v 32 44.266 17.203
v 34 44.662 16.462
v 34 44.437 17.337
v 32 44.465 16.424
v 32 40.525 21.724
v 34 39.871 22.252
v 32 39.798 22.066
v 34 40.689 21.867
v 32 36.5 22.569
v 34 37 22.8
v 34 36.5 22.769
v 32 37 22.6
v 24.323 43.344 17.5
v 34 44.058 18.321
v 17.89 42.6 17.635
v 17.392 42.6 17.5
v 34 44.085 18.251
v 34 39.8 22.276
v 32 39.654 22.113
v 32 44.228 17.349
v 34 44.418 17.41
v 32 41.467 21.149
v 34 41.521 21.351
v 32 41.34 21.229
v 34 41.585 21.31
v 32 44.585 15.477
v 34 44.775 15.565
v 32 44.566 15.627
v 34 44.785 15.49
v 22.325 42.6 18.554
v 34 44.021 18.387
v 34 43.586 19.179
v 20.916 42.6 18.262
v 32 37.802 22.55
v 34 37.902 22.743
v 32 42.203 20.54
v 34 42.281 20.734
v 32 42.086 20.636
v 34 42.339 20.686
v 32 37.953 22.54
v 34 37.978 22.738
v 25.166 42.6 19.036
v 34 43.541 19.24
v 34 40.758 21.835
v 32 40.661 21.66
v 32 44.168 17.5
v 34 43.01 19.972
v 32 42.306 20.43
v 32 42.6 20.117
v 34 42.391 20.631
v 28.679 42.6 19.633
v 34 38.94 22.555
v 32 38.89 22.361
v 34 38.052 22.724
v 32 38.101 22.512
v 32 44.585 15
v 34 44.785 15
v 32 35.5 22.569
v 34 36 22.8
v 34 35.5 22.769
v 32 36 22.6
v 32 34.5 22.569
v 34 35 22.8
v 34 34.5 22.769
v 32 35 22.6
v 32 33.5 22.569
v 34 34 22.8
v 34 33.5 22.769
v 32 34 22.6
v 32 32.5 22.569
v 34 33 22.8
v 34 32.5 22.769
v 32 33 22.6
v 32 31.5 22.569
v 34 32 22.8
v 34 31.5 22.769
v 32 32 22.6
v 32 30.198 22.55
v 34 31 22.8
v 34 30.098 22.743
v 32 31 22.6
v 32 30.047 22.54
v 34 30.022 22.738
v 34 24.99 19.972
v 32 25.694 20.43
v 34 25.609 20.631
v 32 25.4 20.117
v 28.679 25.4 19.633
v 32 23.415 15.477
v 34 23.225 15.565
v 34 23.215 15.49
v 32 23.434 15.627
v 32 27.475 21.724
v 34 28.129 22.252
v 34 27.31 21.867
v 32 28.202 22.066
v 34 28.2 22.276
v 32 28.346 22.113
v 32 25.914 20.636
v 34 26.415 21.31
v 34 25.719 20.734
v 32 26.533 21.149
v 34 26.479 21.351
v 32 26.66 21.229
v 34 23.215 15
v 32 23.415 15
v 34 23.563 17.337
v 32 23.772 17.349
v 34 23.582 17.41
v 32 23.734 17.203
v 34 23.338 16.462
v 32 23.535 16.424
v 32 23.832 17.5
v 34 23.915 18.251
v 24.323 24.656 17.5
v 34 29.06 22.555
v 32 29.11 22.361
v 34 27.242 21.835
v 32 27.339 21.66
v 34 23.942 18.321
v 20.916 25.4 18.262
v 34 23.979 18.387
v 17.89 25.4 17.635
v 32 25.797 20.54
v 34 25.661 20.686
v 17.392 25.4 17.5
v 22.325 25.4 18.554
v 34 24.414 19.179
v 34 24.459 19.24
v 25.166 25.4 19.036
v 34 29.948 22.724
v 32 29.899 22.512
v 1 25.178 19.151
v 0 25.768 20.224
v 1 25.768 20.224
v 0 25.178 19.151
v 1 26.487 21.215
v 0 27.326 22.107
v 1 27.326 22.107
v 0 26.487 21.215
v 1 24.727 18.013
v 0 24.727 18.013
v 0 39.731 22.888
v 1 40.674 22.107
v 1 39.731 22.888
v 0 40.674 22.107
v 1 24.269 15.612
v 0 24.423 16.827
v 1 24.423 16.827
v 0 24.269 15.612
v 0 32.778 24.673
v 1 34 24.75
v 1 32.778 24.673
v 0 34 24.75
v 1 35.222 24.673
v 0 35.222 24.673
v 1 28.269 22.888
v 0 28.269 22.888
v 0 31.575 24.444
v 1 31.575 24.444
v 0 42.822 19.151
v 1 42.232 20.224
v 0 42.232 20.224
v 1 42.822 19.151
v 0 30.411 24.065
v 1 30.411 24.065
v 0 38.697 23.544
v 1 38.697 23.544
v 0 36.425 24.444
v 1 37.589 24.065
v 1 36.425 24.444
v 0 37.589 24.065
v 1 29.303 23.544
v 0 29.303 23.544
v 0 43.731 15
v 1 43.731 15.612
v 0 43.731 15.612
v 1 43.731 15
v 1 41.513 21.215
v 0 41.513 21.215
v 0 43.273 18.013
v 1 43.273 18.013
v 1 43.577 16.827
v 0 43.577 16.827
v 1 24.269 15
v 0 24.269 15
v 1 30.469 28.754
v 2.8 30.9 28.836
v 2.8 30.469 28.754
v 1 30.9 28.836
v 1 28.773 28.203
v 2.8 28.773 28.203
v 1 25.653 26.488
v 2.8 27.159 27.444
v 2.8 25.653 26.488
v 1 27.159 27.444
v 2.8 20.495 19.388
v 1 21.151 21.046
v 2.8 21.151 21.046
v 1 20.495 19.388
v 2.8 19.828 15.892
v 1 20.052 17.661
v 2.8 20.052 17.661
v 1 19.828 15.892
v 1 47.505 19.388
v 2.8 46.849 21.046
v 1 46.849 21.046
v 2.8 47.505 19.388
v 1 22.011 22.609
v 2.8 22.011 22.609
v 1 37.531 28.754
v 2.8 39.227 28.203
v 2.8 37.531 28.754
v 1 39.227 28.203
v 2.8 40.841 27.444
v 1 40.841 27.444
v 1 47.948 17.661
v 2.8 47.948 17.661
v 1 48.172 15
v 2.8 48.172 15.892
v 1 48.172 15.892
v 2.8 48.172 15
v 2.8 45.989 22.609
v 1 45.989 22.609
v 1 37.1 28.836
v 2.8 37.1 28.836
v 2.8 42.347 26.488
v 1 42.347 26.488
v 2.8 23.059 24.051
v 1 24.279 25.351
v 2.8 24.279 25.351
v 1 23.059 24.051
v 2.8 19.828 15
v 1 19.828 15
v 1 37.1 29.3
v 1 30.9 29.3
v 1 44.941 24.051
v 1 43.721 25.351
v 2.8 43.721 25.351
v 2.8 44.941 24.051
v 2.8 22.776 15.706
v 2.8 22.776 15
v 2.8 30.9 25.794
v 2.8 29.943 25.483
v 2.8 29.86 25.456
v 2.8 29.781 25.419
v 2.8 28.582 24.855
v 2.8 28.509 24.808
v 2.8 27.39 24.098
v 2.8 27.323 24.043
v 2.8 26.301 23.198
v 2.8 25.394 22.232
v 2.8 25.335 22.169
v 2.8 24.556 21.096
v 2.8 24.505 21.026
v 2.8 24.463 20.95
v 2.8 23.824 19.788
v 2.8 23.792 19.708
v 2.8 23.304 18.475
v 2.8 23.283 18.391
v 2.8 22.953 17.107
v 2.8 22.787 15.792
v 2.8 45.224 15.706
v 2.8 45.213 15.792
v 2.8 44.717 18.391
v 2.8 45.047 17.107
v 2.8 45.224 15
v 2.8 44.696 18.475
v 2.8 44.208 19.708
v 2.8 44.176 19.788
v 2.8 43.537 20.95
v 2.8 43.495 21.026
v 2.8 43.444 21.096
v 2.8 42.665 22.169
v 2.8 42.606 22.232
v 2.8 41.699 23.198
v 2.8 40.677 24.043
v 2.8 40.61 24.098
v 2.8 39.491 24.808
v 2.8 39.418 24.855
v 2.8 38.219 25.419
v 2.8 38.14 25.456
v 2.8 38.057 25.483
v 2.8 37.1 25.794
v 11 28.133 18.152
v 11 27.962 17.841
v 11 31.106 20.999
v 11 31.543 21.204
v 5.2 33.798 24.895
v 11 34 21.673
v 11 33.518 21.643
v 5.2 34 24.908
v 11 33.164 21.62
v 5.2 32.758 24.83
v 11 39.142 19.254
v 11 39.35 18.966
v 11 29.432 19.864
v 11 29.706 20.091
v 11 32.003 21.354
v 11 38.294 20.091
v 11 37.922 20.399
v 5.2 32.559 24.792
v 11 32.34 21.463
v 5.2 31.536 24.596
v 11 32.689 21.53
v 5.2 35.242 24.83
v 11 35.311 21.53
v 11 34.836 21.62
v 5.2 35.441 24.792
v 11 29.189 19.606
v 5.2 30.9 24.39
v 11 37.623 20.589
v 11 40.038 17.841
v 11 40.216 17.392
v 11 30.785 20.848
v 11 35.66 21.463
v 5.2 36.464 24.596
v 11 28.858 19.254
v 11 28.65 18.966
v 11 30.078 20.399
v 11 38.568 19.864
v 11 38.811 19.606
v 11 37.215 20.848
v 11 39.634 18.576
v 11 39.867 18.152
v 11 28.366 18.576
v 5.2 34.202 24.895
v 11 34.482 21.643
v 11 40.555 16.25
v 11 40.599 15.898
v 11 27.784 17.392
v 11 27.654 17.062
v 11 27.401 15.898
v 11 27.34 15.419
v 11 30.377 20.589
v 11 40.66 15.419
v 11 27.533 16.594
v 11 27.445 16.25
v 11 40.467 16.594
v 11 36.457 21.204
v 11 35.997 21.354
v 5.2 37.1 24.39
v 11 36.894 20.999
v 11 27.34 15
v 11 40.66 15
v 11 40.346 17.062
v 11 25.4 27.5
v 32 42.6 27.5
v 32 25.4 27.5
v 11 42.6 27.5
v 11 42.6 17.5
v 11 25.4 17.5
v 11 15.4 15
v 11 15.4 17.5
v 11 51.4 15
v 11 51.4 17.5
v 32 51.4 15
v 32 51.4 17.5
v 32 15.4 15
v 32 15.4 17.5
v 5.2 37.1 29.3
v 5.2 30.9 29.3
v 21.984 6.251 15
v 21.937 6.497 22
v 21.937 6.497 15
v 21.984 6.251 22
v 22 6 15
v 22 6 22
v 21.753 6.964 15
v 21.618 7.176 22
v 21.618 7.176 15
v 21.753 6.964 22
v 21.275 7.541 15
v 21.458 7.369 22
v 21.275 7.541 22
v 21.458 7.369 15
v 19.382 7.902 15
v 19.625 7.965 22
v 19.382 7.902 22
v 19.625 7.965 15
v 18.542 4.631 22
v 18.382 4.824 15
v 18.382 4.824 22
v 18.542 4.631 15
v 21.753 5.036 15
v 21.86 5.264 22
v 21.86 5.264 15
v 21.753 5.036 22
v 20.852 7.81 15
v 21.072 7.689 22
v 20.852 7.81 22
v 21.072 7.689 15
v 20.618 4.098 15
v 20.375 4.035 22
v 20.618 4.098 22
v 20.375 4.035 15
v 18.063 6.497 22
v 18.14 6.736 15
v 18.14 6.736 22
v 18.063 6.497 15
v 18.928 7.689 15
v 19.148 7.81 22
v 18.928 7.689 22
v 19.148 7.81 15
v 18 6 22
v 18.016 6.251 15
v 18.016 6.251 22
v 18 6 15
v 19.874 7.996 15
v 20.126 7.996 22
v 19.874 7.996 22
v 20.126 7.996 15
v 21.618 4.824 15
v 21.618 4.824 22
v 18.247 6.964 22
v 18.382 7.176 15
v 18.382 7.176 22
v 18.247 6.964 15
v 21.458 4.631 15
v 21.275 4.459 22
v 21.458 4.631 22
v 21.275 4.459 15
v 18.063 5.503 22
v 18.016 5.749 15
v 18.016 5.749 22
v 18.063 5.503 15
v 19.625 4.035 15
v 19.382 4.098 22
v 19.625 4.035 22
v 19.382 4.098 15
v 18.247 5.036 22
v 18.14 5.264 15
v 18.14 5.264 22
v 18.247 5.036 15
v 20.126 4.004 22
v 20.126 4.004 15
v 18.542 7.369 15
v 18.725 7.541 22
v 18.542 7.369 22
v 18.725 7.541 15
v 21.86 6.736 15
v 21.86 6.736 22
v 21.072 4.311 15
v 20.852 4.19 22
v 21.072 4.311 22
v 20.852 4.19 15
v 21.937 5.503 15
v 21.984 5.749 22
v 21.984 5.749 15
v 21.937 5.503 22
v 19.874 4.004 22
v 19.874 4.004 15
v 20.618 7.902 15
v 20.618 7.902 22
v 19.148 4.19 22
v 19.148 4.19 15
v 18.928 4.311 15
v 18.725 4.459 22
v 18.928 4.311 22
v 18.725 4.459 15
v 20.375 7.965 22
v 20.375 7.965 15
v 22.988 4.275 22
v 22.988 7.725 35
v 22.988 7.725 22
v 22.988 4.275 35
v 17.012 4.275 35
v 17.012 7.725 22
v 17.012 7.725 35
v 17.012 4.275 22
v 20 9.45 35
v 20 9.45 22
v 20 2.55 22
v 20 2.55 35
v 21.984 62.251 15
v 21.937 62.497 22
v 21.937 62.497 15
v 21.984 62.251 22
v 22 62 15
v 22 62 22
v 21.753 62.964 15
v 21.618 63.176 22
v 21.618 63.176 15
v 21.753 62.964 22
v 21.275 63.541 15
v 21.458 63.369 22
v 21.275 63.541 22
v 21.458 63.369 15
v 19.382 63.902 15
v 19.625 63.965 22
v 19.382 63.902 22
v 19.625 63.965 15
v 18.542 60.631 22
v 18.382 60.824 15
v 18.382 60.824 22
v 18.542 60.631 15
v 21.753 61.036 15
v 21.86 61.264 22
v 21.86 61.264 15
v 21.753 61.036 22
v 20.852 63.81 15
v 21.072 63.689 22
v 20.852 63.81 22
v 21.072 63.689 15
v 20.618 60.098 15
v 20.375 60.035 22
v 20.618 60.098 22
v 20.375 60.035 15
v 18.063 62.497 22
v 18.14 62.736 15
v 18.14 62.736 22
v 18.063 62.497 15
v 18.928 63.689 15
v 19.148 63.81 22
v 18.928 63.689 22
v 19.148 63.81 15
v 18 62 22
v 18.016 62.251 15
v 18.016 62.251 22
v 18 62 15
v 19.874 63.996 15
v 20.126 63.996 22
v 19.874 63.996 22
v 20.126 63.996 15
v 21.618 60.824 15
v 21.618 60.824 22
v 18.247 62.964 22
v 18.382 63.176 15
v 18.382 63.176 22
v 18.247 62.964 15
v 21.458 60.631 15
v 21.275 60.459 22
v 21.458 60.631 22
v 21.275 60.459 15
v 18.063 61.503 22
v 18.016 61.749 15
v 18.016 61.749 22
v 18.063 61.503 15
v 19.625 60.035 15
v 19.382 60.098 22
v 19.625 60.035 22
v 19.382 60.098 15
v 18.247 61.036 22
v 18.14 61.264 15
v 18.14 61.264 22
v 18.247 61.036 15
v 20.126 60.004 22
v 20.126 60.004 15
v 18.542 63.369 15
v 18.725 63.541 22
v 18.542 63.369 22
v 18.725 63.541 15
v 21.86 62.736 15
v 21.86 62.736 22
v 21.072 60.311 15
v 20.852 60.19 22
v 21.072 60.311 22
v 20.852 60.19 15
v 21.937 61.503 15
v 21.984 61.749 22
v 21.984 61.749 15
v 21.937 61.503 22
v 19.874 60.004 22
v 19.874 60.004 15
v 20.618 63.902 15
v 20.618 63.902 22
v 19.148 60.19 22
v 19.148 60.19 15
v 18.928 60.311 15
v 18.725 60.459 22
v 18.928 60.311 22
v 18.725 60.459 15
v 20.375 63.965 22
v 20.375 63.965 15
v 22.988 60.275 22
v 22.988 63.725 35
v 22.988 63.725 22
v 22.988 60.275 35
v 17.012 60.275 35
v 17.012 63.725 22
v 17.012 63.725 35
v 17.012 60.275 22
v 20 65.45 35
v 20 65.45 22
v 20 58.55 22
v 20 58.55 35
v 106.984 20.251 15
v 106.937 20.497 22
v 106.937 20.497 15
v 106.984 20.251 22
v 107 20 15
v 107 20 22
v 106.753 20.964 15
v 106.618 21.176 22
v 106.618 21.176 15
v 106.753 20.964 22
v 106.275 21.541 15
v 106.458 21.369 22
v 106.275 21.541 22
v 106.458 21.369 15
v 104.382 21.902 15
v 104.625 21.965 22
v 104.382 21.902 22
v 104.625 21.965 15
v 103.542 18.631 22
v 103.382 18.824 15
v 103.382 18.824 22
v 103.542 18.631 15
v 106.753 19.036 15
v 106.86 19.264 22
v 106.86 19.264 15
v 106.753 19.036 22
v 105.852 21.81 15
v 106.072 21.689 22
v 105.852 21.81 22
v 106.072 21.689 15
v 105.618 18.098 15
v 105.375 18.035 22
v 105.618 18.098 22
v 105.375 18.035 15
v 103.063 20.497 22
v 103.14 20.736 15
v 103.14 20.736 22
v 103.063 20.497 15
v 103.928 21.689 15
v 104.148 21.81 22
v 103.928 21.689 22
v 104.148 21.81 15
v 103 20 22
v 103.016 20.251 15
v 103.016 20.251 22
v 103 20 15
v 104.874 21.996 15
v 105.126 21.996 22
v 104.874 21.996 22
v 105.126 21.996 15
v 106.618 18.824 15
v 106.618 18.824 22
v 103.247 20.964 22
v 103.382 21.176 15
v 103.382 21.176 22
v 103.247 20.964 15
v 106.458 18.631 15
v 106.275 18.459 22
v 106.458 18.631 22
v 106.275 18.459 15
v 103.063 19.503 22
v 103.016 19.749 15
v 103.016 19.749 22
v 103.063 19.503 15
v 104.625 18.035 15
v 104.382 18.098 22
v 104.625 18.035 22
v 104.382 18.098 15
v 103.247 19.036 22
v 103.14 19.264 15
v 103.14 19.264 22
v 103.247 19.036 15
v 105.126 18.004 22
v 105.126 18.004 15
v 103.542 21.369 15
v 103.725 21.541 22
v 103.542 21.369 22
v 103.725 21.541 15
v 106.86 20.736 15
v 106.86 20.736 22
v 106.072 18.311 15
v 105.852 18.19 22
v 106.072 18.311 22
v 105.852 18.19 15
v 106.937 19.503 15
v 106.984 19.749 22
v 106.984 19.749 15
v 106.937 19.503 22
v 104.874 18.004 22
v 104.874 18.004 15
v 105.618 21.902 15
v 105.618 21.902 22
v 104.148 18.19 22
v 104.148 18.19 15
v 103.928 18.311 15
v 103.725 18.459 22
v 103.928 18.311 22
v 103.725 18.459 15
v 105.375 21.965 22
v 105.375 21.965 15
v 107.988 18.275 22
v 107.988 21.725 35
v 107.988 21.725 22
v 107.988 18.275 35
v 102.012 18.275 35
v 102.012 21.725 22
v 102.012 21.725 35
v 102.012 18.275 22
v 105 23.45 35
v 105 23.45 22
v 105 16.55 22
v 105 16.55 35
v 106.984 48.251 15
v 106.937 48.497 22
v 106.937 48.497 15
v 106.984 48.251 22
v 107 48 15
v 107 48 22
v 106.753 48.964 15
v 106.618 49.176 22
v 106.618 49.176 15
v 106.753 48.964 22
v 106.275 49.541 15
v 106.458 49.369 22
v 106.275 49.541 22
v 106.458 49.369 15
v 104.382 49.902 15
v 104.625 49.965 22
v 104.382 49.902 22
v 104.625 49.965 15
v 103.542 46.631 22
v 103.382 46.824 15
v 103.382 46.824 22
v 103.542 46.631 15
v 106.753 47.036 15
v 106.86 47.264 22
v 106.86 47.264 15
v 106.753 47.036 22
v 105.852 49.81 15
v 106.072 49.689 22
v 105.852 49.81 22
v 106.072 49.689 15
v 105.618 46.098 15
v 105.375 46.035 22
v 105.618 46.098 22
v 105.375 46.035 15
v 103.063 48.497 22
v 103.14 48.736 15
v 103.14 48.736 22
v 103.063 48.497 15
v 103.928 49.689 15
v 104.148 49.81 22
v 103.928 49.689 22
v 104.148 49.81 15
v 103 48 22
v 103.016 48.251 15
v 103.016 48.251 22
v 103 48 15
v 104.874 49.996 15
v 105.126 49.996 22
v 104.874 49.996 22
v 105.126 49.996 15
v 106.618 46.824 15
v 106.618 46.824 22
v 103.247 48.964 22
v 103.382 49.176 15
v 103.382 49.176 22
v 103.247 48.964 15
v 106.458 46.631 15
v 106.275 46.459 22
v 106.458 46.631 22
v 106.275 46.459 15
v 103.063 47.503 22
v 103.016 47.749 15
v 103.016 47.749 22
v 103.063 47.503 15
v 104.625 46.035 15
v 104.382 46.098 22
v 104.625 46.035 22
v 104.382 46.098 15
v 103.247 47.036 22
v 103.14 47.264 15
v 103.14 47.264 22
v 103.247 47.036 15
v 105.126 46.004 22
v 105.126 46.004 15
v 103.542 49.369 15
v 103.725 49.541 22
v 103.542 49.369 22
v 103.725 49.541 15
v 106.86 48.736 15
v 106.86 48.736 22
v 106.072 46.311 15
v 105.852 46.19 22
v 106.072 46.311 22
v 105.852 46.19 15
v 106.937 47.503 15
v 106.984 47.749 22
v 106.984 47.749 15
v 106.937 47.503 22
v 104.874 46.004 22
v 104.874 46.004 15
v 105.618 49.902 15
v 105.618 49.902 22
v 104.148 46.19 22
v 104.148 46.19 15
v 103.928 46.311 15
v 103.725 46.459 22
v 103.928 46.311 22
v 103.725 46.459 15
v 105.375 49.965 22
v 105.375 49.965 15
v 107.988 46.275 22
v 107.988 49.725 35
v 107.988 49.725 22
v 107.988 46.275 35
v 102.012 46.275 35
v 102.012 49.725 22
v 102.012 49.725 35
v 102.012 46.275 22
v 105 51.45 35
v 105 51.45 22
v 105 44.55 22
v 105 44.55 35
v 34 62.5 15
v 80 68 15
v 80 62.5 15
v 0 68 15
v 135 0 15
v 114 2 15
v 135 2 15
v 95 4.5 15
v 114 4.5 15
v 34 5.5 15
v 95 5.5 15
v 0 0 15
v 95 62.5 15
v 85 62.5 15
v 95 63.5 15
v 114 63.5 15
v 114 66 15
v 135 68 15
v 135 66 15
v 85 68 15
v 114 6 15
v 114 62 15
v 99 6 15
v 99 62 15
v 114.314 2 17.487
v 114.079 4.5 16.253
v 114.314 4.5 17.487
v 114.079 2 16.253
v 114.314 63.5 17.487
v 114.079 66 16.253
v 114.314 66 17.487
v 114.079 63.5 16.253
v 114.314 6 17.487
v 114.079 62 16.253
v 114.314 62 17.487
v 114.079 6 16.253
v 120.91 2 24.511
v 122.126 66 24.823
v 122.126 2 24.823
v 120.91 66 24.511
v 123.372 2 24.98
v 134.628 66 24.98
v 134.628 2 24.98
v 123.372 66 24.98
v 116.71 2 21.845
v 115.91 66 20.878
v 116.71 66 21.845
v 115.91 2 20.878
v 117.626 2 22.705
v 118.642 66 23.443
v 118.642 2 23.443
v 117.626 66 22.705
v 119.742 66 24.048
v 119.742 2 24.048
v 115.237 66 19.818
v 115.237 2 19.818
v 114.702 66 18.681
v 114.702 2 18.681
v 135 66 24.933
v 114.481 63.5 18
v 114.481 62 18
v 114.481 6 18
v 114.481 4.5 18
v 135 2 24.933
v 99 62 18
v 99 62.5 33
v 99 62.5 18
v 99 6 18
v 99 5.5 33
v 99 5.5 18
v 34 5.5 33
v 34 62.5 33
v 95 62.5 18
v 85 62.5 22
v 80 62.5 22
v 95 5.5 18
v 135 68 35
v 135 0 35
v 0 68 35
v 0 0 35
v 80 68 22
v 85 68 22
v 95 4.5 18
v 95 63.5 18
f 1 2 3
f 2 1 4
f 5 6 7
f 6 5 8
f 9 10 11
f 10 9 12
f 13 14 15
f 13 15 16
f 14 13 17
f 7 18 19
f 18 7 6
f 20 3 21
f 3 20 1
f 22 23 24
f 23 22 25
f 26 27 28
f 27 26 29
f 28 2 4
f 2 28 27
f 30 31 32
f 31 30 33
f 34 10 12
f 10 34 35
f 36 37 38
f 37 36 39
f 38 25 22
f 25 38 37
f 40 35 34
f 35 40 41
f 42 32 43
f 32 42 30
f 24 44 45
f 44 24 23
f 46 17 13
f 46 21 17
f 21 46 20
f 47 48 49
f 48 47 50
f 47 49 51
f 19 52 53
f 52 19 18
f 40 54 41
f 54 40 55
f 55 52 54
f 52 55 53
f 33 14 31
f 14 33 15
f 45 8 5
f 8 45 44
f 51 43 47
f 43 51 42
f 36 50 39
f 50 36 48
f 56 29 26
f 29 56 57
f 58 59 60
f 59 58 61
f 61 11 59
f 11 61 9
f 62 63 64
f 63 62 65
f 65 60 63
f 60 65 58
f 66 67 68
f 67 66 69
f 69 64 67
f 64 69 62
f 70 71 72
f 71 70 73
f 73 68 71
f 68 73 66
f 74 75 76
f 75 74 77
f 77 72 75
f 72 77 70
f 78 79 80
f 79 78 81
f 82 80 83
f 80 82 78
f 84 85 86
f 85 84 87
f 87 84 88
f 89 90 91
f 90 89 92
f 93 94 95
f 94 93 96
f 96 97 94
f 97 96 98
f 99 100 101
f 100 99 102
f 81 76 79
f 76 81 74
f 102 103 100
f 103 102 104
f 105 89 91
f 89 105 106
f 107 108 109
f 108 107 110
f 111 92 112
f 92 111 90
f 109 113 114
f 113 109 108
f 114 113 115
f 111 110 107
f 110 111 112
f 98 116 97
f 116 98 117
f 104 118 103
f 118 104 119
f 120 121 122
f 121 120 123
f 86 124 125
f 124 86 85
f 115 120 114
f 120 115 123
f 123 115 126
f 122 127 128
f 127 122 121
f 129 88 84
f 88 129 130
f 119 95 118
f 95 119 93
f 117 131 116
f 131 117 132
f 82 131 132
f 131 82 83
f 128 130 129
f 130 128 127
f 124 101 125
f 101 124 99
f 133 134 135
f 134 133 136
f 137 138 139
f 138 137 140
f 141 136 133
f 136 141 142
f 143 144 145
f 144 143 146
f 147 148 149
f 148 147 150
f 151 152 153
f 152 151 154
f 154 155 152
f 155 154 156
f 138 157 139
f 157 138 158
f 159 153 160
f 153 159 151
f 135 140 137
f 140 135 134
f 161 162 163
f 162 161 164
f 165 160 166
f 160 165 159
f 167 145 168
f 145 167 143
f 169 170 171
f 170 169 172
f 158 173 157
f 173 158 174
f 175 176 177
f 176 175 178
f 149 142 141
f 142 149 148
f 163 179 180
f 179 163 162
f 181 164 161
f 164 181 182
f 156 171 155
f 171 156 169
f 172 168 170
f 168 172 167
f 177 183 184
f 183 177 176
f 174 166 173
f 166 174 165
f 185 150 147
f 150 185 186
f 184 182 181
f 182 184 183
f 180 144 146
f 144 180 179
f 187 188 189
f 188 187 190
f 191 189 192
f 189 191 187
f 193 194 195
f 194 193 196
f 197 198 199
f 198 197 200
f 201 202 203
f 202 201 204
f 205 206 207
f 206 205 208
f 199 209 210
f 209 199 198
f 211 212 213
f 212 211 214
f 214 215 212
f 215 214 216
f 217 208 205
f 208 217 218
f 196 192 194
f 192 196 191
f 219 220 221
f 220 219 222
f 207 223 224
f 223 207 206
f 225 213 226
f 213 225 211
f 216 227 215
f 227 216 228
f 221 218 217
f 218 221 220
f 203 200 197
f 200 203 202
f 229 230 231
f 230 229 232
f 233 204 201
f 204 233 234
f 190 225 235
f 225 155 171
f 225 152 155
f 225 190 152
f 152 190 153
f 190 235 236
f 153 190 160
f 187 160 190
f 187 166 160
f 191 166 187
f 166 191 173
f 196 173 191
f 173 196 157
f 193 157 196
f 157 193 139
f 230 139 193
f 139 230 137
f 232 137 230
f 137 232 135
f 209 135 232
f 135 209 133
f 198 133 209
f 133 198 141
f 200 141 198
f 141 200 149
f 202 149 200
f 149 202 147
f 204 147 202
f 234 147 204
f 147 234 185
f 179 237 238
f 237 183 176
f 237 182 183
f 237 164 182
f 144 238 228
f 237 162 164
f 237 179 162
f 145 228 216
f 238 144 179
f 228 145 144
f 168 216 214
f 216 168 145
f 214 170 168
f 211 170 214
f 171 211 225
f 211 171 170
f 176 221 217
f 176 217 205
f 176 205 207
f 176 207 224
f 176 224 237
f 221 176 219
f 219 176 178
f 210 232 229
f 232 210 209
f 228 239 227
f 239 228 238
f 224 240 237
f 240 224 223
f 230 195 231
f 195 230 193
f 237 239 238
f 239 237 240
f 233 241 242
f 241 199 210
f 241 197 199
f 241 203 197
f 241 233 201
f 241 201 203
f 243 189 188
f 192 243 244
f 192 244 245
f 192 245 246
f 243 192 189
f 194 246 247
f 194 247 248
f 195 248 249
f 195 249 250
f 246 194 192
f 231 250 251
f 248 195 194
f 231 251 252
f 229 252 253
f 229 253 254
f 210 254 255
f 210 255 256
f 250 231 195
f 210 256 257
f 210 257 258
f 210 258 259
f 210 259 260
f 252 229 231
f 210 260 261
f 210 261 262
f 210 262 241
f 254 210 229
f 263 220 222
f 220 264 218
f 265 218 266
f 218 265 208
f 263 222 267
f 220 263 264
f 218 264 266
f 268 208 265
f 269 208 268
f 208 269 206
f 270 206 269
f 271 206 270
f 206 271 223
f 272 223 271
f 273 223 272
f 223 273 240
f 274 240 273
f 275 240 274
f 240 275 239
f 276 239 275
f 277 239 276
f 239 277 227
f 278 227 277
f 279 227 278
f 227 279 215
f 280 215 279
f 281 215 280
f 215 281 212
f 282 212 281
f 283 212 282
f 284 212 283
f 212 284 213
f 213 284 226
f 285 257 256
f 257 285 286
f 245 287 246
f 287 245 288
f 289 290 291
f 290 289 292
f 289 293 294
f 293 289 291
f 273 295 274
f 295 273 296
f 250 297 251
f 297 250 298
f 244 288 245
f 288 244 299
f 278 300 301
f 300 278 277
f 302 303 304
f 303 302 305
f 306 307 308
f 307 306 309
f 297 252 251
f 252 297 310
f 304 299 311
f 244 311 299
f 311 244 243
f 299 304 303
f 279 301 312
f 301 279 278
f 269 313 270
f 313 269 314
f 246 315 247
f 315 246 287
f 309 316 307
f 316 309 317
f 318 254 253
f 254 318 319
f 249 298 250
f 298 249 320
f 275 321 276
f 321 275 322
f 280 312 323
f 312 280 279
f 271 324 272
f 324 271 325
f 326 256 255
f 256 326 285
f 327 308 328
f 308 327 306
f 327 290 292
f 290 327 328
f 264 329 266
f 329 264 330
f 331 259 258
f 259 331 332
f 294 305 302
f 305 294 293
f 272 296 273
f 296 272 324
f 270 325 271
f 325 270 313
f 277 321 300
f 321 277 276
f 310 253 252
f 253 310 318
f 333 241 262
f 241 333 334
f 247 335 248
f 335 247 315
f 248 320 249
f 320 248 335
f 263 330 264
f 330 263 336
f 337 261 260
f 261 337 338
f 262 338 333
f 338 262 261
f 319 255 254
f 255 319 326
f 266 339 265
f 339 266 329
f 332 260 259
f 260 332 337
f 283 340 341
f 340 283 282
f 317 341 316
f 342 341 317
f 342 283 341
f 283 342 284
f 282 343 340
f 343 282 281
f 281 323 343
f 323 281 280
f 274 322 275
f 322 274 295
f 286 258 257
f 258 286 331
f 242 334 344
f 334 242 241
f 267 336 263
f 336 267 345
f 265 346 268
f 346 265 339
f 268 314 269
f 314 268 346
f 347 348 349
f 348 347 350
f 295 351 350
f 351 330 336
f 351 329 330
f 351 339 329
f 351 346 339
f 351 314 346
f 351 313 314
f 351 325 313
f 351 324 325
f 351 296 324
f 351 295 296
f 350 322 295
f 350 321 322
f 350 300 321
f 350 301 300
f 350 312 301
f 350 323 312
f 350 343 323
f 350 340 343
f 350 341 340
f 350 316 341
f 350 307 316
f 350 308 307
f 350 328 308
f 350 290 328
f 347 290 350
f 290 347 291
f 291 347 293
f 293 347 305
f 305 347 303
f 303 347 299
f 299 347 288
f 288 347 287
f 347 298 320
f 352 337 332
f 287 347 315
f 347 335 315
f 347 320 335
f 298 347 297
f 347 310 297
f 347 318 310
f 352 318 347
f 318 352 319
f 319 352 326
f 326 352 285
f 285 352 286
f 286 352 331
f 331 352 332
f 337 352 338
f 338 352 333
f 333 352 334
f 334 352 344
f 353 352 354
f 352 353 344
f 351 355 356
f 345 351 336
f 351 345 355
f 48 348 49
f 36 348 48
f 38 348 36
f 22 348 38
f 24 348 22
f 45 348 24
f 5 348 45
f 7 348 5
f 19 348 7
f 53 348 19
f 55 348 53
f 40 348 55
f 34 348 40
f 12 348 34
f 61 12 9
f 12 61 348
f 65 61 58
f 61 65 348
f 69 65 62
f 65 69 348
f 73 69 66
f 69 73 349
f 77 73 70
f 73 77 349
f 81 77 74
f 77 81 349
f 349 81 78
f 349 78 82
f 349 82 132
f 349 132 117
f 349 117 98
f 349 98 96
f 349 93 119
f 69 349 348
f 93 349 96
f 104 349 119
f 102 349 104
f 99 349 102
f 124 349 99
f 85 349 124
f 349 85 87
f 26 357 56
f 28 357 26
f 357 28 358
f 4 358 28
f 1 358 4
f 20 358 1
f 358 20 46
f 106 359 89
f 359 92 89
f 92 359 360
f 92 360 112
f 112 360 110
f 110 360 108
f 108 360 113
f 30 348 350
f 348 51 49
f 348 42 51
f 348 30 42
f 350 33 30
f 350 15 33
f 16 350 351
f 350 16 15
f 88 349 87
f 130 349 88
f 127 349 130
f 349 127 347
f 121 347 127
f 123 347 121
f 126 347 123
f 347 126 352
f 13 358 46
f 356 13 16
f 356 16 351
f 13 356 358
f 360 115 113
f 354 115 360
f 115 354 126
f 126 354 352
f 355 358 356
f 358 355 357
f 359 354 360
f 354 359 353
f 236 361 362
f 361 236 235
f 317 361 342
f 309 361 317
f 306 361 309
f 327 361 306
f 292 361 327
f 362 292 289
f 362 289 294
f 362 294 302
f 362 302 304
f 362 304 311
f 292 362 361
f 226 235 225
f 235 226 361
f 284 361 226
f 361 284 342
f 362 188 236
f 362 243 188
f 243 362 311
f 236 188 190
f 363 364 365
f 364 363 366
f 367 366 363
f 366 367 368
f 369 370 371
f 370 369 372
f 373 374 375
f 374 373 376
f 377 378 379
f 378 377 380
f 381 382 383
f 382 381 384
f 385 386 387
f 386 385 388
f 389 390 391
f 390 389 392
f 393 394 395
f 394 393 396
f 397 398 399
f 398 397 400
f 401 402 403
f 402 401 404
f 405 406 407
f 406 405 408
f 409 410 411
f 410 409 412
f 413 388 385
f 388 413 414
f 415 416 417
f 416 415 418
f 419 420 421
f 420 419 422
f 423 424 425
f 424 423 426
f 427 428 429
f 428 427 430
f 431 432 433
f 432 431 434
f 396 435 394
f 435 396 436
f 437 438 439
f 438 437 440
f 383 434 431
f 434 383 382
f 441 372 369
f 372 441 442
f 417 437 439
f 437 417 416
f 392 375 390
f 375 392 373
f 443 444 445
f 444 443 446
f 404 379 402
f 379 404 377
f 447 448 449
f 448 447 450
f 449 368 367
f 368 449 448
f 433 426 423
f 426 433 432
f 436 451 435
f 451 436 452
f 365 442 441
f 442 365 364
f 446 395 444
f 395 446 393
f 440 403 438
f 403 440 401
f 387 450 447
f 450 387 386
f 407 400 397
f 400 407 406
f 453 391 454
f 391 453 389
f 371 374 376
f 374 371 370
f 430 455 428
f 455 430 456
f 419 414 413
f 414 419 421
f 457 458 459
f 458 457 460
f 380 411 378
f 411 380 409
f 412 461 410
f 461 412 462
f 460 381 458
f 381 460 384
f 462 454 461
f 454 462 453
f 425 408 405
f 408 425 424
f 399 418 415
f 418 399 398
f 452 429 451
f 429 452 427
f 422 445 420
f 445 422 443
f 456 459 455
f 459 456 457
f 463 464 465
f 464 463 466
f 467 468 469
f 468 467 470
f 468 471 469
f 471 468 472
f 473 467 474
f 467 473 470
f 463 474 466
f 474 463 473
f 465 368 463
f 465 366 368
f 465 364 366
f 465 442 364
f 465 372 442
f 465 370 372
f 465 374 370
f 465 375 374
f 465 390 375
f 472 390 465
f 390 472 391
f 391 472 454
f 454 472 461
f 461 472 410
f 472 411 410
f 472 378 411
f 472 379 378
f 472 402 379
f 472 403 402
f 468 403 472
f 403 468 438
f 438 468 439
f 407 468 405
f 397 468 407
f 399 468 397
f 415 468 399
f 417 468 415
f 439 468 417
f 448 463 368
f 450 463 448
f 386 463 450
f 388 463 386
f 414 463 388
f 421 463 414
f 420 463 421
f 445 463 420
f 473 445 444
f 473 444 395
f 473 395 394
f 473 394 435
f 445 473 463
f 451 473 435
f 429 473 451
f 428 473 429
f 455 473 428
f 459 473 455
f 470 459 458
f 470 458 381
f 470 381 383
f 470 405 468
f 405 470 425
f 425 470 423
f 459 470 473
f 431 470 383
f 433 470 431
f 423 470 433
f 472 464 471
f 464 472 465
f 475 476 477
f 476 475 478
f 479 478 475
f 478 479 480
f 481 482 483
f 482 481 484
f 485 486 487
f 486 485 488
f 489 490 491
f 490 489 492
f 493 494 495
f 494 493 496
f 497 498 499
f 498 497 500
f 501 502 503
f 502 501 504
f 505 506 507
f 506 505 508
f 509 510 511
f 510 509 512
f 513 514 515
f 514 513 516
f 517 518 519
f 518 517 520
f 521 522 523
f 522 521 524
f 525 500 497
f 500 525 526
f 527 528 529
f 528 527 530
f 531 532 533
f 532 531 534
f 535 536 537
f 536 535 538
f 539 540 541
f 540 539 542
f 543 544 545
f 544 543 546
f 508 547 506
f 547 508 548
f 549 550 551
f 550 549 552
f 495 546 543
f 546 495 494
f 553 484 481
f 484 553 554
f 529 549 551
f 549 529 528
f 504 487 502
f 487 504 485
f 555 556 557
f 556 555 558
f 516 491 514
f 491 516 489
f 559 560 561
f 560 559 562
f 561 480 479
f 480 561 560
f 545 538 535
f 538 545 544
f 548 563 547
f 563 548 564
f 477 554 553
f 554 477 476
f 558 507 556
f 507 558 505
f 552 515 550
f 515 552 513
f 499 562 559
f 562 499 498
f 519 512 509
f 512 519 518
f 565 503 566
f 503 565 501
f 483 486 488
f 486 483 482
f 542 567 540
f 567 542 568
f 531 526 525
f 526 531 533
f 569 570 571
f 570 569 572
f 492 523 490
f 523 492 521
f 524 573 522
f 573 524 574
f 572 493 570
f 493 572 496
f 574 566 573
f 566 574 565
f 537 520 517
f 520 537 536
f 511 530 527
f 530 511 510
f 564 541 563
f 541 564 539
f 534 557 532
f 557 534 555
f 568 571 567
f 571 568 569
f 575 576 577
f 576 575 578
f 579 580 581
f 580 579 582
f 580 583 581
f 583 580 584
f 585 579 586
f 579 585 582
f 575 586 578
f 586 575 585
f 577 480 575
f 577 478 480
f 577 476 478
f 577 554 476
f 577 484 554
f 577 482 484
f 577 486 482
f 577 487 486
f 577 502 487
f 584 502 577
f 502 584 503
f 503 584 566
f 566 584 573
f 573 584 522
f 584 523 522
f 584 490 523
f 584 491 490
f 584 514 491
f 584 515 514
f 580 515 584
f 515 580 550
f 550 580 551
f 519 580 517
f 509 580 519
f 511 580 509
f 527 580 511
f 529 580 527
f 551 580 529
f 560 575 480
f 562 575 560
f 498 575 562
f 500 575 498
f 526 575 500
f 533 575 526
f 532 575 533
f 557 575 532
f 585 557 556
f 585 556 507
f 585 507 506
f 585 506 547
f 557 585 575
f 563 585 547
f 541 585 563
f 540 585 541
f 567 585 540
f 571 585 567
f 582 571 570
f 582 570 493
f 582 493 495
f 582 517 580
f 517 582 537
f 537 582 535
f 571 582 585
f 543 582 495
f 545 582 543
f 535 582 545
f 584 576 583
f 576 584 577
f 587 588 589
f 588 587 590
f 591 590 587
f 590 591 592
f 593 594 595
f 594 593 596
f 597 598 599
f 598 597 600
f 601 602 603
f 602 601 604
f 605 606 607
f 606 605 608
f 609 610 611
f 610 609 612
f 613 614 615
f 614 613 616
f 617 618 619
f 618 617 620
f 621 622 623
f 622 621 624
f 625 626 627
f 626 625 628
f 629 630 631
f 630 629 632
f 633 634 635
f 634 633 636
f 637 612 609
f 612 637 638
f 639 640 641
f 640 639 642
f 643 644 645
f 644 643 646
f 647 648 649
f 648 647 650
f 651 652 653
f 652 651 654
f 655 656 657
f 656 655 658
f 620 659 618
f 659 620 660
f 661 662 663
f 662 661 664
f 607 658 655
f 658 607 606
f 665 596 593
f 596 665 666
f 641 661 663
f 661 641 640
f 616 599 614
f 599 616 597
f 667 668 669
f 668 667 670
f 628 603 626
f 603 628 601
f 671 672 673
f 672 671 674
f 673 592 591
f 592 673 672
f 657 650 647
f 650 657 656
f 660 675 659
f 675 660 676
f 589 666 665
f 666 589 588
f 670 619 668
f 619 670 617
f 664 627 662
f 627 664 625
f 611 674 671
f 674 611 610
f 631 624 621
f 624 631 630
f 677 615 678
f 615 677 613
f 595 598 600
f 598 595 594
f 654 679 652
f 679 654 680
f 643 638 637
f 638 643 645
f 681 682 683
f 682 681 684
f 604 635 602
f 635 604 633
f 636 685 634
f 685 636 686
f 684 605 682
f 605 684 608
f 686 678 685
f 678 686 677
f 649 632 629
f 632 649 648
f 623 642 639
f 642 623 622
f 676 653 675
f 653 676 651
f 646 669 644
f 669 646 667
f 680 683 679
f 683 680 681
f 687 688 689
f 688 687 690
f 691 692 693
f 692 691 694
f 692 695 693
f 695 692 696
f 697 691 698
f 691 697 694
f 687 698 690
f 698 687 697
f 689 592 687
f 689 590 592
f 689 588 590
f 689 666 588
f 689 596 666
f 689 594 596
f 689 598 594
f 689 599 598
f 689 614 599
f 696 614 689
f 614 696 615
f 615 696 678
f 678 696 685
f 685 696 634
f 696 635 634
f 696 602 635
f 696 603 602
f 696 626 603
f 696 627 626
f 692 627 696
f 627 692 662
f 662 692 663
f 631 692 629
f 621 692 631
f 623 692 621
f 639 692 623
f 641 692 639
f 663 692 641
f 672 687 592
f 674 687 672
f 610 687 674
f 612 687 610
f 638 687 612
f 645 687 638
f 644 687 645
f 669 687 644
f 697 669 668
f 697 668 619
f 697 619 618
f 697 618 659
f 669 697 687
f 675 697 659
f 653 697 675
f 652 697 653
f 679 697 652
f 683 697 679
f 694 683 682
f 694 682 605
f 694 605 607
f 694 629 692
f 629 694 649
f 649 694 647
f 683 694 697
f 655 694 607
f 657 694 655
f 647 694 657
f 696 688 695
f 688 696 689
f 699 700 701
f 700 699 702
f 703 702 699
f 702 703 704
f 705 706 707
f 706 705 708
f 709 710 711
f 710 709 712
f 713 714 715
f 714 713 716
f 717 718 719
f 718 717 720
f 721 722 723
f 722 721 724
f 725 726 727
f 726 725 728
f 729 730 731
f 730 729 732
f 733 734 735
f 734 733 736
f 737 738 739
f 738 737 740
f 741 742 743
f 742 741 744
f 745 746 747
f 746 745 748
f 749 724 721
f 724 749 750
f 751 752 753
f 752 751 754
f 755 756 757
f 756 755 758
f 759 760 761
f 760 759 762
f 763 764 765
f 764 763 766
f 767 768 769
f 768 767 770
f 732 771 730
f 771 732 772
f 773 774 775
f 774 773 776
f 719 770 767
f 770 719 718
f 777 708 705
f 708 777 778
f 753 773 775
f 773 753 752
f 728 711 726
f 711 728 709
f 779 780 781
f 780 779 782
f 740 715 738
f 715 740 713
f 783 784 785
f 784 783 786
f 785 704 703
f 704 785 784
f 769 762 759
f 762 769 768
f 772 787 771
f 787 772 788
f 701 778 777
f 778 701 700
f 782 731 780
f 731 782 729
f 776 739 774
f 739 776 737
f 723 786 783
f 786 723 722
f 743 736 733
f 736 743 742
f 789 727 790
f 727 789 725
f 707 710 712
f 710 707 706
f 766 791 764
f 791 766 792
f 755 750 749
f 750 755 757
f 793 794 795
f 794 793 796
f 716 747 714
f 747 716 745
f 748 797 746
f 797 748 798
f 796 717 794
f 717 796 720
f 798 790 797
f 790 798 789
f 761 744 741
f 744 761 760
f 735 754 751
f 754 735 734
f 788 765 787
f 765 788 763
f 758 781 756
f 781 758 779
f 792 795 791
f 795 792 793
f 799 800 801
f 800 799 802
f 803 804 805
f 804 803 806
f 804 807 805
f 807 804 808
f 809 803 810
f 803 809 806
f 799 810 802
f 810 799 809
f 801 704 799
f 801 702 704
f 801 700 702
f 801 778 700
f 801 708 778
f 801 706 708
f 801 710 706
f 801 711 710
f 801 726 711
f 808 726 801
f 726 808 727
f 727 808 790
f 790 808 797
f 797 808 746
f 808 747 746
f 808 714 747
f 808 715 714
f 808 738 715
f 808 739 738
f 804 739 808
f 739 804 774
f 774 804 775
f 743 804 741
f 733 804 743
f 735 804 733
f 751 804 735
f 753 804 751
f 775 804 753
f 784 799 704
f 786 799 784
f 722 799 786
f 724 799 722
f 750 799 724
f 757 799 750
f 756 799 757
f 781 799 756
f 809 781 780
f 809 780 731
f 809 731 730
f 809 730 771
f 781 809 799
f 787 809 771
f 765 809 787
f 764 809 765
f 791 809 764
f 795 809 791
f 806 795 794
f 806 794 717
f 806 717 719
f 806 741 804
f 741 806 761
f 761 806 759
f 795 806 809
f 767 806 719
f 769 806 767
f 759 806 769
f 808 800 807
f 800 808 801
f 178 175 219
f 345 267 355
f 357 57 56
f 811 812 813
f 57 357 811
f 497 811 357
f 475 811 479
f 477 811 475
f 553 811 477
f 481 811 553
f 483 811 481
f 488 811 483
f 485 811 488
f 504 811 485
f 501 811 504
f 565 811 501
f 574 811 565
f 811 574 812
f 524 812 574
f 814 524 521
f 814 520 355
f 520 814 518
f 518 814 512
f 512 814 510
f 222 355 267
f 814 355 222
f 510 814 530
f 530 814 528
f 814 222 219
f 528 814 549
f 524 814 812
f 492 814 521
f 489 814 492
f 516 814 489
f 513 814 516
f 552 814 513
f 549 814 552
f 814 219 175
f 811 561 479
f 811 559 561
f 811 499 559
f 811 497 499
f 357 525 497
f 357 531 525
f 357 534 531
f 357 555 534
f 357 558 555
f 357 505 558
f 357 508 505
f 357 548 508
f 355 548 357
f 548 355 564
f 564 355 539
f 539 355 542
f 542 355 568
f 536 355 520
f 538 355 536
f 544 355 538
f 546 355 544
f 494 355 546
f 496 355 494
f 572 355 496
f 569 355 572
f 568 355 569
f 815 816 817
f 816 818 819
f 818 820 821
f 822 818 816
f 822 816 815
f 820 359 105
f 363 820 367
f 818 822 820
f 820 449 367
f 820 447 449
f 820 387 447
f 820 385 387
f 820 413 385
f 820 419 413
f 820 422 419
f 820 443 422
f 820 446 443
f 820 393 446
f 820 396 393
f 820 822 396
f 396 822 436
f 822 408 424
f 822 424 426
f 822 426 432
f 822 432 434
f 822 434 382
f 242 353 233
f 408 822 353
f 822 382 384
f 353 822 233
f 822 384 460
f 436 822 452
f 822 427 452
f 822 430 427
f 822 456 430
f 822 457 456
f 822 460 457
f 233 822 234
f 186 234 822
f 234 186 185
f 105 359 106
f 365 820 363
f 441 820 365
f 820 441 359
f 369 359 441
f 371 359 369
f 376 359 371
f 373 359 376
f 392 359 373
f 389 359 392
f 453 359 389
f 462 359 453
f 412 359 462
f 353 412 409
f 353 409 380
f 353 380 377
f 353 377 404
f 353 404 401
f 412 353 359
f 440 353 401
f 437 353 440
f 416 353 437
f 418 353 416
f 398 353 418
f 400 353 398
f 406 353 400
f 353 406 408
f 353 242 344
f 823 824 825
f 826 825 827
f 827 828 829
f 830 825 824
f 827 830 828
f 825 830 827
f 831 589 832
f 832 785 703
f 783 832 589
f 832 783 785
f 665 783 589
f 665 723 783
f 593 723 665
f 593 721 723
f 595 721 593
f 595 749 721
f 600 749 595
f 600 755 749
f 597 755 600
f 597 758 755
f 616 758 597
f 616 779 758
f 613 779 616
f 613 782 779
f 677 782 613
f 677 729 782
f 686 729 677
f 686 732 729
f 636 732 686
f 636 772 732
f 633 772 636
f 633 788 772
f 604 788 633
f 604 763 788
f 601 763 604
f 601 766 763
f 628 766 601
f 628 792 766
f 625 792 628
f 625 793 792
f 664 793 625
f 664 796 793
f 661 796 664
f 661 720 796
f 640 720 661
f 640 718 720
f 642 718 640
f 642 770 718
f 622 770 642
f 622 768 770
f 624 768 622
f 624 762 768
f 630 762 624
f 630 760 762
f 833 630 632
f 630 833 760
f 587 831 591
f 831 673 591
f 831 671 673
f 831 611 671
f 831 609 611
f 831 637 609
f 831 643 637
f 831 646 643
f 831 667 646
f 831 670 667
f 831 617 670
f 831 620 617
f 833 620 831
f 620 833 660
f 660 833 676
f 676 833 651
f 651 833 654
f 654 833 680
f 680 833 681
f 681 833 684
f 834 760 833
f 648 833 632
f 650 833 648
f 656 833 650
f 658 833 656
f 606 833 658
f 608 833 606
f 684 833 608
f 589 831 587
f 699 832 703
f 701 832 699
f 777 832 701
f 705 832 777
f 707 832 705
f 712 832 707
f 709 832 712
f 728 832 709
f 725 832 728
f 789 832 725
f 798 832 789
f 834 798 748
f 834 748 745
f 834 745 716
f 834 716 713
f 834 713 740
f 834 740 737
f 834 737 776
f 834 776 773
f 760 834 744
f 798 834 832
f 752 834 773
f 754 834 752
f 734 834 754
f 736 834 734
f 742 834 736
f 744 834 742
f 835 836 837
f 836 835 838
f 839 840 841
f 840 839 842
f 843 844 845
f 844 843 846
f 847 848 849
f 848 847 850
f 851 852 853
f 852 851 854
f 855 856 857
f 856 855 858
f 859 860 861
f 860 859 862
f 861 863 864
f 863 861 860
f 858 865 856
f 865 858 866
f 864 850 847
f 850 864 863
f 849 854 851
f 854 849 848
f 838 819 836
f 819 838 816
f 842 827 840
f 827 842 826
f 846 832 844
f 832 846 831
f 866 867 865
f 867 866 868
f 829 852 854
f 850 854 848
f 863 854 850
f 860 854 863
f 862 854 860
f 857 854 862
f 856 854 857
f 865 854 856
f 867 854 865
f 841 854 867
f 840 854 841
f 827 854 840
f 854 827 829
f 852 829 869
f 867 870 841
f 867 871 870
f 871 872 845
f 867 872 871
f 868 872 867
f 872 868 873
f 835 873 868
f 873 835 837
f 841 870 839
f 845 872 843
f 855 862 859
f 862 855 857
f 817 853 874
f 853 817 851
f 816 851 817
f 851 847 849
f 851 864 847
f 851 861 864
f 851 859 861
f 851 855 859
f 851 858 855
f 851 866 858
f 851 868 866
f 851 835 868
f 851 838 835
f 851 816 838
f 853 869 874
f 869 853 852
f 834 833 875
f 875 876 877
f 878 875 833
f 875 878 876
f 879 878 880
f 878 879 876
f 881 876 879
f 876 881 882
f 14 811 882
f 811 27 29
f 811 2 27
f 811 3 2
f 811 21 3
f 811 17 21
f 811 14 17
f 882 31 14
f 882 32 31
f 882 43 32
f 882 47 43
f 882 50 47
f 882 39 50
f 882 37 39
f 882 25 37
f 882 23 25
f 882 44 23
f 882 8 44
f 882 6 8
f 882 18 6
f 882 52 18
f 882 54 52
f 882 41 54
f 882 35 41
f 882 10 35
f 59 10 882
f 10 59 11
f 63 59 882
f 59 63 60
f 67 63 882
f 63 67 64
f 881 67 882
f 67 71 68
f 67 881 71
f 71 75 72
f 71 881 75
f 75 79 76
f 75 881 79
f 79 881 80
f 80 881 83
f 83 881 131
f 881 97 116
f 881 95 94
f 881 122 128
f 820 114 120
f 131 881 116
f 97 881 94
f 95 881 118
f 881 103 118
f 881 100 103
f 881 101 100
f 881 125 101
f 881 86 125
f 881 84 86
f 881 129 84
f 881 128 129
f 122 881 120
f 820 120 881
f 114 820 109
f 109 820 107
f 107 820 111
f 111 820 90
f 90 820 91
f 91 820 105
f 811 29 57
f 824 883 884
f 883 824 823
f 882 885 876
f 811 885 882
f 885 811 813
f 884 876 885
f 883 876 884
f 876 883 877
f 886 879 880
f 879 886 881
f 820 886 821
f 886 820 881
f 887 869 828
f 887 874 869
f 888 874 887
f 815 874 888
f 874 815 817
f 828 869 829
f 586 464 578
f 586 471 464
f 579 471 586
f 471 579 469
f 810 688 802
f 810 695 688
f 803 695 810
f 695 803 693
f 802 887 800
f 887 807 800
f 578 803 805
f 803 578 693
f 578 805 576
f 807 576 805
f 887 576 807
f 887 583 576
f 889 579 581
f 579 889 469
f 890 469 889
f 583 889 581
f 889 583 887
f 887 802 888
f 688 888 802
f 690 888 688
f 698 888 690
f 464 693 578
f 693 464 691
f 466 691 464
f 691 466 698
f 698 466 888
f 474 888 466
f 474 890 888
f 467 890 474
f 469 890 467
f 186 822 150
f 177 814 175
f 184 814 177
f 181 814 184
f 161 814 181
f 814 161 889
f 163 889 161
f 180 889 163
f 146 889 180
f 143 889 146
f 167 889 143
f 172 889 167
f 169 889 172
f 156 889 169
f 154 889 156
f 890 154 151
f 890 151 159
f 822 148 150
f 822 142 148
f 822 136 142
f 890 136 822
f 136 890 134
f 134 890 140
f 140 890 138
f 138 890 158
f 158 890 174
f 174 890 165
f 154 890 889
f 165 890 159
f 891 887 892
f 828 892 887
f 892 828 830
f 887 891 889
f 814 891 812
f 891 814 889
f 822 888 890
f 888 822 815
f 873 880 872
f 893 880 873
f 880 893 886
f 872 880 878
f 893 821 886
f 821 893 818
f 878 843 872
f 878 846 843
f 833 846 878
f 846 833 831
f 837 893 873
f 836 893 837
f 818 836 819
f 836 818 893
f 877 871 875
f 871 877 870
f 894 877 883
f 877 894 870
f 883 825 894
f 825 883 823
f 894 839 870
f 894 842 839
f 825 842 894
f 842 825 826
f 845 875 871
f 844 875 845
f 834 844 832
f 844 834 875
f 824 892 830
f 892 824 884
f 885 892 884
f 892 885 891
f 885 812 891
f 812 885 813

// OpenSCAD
l = 135;
w = 68;
h = 30;

pcb_w = 57;
pcb_l = 65;

rear_light_d = 24;
rear_light_h = 15;

stem_w = 35;
stem_d = 32;

seat_d = 27.1;


//-- Nut parameters
nut_h = 2.5;
nut_radius = 6.9/2;
nut_drill = 3.4;

module lens() {
  rotate( v = [1,0,0], a = 180 ) {
    translate(v=[0, 0, -2])
      cylinder(h = 2.5, r = 9.75, $fn = 50);
    cylinder(h = 1.8, r = 14.2, $fn = 50);
    cylinder(h = 13, r1 = 12.25, r2 = 5, $fn = 50);
    translate(v=[0, -3, 15]) {
      cylinder(h = 20, r1 = 6, r2=8, $fn = 50);
      for(i = [0 : 6]) {
        translate(v=[0, i, 0]) {
          cylinder(h = 20, r1 = 6, r2=8, $fn = 50);
        }
      }
    }
  }
  translate(v=[4.8, (-6.2 / 2), -4.2]) {
    cube(size=[9.5, 6.2, 4.2]);
  }
  translate(v=[-25/2, -17.2/2, -(18 + 13)]) {
    cube(size=[25, 17.2, 21]);
    translate(v=[18/2, -20/2, 0])
    cube(size=[6, 36, 21]);
  }
}

module nut(z, radius, fn) {
  rotate([0, 0, 90]) 
  cylinder(h=z, r=radius, $fn=fn, center=true);
}

module disc(z, s) {
  rotate([0, 0, 90]) 
  cylinder(h=z, r=s, $fn=50, center=true);
}

module mscrew(z) {
  translate(v=[0, 0, -5]) {
    cylinder(h = (z + 10), r = 2, $fn = 50);
  }
  translate(v=[0, 0, z-1]) {
    disc(8, 4);
  }
}

module mount(s, mh) {
  mscrew(mh);
  translate([s, 0, 0])
    mscrew(mh);
  translate([0, s, 0]) {
    mscrew(mh);
    translate([s, 0, 0])
      mscrew(mh);
  }
}

module mscrew2(z) {
  translate(v=[0, 0, -5]) {
    cylinder(h = (z + 10), r = 2, $fn = 50);
  }
  translate(v=[0, 0, 1]) {
    nut(22, nut_radius, 6);
  }
}

module mount2(s, mh) {
  mscrew2(mh);
  translate([s, 0, 0])
    mscrew2(mh);
  translate([0, s, 0]) {
    mscrew2(mh);
    translate([s, 0, 0])
      mscrew2(mh);
  }
}

module screw() {
  translate(v=[0, 0, -5]) {
    cylinder(h = (h + 10), r = 2, $fn = 50);
  }
  translate(v=[0, 0, h-1]) {
    nut(14, nut_radius, 6);
  }
  translate(v=[0, 0, 1]) {
    nut(14, nut_radius, 6);
  }
}

module screw_pair(x, inset) {
  translate(v=[x, inset, 0]) {
    screw();
  }
  translate(v=[x, w - inset, 0]) {
    screw();
  }
}

module rscrew() {
  translate(v=[0, 0, -5]) {
    cylinder(h = (h + 10), r = 2, $fn = 50);
  }
  translate(v=[0, 0, h-1]) {
    nut(14, nut_radius, 6);
  }
  translate(v=[0, 0, 1]) {
    nut(14, nut_radius + 0.7, 60);
  }
}

module rscrew_pair(x, inset) {
  translate(v=[x, inset, 0]) {
    rscrew();
  }
  translate(v=[x, w - inset, 0]) {
    rscrew();
  }
}


module case(top) {
  difference() {
    cube(size=[l, w, h+5]);
    translate(v=[1, w / 2, h / 2]) {
      rotate( v = [0, 1, 0], a = -90 ) {
        lens();
      }
    }
    screw_pair(20, 6);
    screw_pair(l - 30, 20);
    if (top == 1) {
      translate(v=[-2, -2, -2]) {
        cube(size=[l+ 5, w + 5, (h / 2) + 2]);
      }
    } else {
      translate(v=[-2, -2, (h/2)+1]) {
        cube(size=[l+ 5, w + 5, (h / 2) + 10]);
      }
    }

    // battery wires
    translate([30 + pcb_l, 4.5, h/2 - 1])
      cube(size=[20, 1.5, 4]);
    translate([30 + pcb_l, w - 6, h/2 - 1])
      cube(size=[20, 1.5, 4]);

    // mount
    translate([60, (w - 25) / 2, 0])
      mount(25, 10);

    translate([34, 0, -2]) {
      // pcb
      translate([0, (w - pcb_w) / 2, 10]) {
        cube(size=[pcb_l, pcb_w, h - 5]);
      }

      // battery
      for(i = [0 : 10]) {
        translate([pcb_l + 25 + i, w - 2, h/2 + 2]) {
          rotate( v = [1,0,0], a = 90 ) {
            cylinder(h = w - 4, r = 10, $fn = 50);
          }
        }
      }
    }
    
    // light sensor
    translate([45, 6, 11]) {
      rotate(v=[1, 0, 0], a=90) {
        cylinder(h = 20, r = 2.8, $fn = 50);
        translate([0, 0, 2])
        cylinder(h = 5, r = 4, $fn = 50);
        translate([0, 0, -4.5])
        cylinder(h = 5, r = 5, $fn = 50);
      }
    }
    
    // speedometer light
    translate([45, w + 10, 9]) {
      rotate(v=[1, 0, 0], a=90) {
        cylinder(h = 35, r = 4.3, $fn = 50);
        translate([0, 0, 11.5])
        cylinder(h = 10, r = 5.5, $fn = 50);
      }
    }
    
    // hole for wires
    if (top == 1) {
      translate([80, w - 10, h/2 - 1])
      cube([5, 20, 8]);
    }
  }
}

module stem2(sl, sw, sh) {
  difference() {
    difference() {
      union() {
        translate([45, 0, -45])
        cube(size = [sl -20, sw, sh + 30]);
        
        cube(size = [sl, sw, sh]);
        translate([20, 0, 0]) {
          for(i=[0 : sw]) {
            translate([0, i, 0])
            cylinder(h=sh, r= 20, $fn = 50);
          }
        }
      }
      for(i = [0 : 3]) {
        translate(v=[25 + i,sw/2,-1]) {
          cylinder(h = sh + 4, r = (stem_d / 2), $fn = 50);
        }
      }
    }
    translate([5, -5, 10]) {
      rotate(v=[0, 1, 0], a = 90) {
        screw();
        translate([-20, 0, 0])
        screw();
        translate([0, 55, 0])
        screw();
        translate([-20, 55, 0])
        screw();
      }
    }
    translate([20, 0, 30])
    rotate(v=[0, 1, 0], a = 78) {
      translate([47, 10, 15])
      mount2(25, 30);
      translate([-10, -3, 40])
      cube([110, 50, 50]);
      translate([35, -10, -31])
      cube([110,60, 50]);
    }
    
  }
  
  
}

module stem(top) {
  difference() {
    translate([-45 + (100 * top), 0, 0])
    stem2(75, 45, 40);
    translate([-20, -40, -20])
    cube([100, 130, 100]);
  }
}

module rear2(x, y) {
  difference() {
    translate([0, 0, -2])
    cube([x, y, 56]);
    translate([x/2, y/2, 0]) {
      cylinder(h = 16, r = 11.9, $fn = 50);
      translate([0, 0, -4]) {
        cylinder(h = 5, r = 10, $fn = 50);
      }
    }
    
    // tube
    translate([x/2, x + 35, 31]) {
      rotate(v=[1, 0, 0], a = 90)
      cylinder(h = x + 70, r = (seat_d / 2), $fn = 50);
      translate([0, 0, -17])
      rotate(v=[1, 0, 0], a = 90)
      cylinder(h = x + 5, r = 1.8, $fn = 50);
    }

    // screws
    translate([2, -11, 68])
    rotate(v = [0, 1, 0], a = 90) {
      rscrew_pair(20, 17);
    }
    translate([2, -11, 25])
    rotate(v = [0, 1, 0], a = 90) {
      rscrew_pair(20, 17);
    }
  }
}

module rear(top) {
  difference() {
    rear2(34, 46);
    if (top == 0) {
      translate([34 - 17, -10, -10])
      cube([35, 70, 80]);
    } else {
      translate([-18, -10, -10])
      cube([35, 70, 80]);
    }
  }
}

//rear(0);

//translate([34, 0, -20])
//rotate(v=[0, 1, 0], a = 180)
//rear(1);

//stem(1);
case(1);
